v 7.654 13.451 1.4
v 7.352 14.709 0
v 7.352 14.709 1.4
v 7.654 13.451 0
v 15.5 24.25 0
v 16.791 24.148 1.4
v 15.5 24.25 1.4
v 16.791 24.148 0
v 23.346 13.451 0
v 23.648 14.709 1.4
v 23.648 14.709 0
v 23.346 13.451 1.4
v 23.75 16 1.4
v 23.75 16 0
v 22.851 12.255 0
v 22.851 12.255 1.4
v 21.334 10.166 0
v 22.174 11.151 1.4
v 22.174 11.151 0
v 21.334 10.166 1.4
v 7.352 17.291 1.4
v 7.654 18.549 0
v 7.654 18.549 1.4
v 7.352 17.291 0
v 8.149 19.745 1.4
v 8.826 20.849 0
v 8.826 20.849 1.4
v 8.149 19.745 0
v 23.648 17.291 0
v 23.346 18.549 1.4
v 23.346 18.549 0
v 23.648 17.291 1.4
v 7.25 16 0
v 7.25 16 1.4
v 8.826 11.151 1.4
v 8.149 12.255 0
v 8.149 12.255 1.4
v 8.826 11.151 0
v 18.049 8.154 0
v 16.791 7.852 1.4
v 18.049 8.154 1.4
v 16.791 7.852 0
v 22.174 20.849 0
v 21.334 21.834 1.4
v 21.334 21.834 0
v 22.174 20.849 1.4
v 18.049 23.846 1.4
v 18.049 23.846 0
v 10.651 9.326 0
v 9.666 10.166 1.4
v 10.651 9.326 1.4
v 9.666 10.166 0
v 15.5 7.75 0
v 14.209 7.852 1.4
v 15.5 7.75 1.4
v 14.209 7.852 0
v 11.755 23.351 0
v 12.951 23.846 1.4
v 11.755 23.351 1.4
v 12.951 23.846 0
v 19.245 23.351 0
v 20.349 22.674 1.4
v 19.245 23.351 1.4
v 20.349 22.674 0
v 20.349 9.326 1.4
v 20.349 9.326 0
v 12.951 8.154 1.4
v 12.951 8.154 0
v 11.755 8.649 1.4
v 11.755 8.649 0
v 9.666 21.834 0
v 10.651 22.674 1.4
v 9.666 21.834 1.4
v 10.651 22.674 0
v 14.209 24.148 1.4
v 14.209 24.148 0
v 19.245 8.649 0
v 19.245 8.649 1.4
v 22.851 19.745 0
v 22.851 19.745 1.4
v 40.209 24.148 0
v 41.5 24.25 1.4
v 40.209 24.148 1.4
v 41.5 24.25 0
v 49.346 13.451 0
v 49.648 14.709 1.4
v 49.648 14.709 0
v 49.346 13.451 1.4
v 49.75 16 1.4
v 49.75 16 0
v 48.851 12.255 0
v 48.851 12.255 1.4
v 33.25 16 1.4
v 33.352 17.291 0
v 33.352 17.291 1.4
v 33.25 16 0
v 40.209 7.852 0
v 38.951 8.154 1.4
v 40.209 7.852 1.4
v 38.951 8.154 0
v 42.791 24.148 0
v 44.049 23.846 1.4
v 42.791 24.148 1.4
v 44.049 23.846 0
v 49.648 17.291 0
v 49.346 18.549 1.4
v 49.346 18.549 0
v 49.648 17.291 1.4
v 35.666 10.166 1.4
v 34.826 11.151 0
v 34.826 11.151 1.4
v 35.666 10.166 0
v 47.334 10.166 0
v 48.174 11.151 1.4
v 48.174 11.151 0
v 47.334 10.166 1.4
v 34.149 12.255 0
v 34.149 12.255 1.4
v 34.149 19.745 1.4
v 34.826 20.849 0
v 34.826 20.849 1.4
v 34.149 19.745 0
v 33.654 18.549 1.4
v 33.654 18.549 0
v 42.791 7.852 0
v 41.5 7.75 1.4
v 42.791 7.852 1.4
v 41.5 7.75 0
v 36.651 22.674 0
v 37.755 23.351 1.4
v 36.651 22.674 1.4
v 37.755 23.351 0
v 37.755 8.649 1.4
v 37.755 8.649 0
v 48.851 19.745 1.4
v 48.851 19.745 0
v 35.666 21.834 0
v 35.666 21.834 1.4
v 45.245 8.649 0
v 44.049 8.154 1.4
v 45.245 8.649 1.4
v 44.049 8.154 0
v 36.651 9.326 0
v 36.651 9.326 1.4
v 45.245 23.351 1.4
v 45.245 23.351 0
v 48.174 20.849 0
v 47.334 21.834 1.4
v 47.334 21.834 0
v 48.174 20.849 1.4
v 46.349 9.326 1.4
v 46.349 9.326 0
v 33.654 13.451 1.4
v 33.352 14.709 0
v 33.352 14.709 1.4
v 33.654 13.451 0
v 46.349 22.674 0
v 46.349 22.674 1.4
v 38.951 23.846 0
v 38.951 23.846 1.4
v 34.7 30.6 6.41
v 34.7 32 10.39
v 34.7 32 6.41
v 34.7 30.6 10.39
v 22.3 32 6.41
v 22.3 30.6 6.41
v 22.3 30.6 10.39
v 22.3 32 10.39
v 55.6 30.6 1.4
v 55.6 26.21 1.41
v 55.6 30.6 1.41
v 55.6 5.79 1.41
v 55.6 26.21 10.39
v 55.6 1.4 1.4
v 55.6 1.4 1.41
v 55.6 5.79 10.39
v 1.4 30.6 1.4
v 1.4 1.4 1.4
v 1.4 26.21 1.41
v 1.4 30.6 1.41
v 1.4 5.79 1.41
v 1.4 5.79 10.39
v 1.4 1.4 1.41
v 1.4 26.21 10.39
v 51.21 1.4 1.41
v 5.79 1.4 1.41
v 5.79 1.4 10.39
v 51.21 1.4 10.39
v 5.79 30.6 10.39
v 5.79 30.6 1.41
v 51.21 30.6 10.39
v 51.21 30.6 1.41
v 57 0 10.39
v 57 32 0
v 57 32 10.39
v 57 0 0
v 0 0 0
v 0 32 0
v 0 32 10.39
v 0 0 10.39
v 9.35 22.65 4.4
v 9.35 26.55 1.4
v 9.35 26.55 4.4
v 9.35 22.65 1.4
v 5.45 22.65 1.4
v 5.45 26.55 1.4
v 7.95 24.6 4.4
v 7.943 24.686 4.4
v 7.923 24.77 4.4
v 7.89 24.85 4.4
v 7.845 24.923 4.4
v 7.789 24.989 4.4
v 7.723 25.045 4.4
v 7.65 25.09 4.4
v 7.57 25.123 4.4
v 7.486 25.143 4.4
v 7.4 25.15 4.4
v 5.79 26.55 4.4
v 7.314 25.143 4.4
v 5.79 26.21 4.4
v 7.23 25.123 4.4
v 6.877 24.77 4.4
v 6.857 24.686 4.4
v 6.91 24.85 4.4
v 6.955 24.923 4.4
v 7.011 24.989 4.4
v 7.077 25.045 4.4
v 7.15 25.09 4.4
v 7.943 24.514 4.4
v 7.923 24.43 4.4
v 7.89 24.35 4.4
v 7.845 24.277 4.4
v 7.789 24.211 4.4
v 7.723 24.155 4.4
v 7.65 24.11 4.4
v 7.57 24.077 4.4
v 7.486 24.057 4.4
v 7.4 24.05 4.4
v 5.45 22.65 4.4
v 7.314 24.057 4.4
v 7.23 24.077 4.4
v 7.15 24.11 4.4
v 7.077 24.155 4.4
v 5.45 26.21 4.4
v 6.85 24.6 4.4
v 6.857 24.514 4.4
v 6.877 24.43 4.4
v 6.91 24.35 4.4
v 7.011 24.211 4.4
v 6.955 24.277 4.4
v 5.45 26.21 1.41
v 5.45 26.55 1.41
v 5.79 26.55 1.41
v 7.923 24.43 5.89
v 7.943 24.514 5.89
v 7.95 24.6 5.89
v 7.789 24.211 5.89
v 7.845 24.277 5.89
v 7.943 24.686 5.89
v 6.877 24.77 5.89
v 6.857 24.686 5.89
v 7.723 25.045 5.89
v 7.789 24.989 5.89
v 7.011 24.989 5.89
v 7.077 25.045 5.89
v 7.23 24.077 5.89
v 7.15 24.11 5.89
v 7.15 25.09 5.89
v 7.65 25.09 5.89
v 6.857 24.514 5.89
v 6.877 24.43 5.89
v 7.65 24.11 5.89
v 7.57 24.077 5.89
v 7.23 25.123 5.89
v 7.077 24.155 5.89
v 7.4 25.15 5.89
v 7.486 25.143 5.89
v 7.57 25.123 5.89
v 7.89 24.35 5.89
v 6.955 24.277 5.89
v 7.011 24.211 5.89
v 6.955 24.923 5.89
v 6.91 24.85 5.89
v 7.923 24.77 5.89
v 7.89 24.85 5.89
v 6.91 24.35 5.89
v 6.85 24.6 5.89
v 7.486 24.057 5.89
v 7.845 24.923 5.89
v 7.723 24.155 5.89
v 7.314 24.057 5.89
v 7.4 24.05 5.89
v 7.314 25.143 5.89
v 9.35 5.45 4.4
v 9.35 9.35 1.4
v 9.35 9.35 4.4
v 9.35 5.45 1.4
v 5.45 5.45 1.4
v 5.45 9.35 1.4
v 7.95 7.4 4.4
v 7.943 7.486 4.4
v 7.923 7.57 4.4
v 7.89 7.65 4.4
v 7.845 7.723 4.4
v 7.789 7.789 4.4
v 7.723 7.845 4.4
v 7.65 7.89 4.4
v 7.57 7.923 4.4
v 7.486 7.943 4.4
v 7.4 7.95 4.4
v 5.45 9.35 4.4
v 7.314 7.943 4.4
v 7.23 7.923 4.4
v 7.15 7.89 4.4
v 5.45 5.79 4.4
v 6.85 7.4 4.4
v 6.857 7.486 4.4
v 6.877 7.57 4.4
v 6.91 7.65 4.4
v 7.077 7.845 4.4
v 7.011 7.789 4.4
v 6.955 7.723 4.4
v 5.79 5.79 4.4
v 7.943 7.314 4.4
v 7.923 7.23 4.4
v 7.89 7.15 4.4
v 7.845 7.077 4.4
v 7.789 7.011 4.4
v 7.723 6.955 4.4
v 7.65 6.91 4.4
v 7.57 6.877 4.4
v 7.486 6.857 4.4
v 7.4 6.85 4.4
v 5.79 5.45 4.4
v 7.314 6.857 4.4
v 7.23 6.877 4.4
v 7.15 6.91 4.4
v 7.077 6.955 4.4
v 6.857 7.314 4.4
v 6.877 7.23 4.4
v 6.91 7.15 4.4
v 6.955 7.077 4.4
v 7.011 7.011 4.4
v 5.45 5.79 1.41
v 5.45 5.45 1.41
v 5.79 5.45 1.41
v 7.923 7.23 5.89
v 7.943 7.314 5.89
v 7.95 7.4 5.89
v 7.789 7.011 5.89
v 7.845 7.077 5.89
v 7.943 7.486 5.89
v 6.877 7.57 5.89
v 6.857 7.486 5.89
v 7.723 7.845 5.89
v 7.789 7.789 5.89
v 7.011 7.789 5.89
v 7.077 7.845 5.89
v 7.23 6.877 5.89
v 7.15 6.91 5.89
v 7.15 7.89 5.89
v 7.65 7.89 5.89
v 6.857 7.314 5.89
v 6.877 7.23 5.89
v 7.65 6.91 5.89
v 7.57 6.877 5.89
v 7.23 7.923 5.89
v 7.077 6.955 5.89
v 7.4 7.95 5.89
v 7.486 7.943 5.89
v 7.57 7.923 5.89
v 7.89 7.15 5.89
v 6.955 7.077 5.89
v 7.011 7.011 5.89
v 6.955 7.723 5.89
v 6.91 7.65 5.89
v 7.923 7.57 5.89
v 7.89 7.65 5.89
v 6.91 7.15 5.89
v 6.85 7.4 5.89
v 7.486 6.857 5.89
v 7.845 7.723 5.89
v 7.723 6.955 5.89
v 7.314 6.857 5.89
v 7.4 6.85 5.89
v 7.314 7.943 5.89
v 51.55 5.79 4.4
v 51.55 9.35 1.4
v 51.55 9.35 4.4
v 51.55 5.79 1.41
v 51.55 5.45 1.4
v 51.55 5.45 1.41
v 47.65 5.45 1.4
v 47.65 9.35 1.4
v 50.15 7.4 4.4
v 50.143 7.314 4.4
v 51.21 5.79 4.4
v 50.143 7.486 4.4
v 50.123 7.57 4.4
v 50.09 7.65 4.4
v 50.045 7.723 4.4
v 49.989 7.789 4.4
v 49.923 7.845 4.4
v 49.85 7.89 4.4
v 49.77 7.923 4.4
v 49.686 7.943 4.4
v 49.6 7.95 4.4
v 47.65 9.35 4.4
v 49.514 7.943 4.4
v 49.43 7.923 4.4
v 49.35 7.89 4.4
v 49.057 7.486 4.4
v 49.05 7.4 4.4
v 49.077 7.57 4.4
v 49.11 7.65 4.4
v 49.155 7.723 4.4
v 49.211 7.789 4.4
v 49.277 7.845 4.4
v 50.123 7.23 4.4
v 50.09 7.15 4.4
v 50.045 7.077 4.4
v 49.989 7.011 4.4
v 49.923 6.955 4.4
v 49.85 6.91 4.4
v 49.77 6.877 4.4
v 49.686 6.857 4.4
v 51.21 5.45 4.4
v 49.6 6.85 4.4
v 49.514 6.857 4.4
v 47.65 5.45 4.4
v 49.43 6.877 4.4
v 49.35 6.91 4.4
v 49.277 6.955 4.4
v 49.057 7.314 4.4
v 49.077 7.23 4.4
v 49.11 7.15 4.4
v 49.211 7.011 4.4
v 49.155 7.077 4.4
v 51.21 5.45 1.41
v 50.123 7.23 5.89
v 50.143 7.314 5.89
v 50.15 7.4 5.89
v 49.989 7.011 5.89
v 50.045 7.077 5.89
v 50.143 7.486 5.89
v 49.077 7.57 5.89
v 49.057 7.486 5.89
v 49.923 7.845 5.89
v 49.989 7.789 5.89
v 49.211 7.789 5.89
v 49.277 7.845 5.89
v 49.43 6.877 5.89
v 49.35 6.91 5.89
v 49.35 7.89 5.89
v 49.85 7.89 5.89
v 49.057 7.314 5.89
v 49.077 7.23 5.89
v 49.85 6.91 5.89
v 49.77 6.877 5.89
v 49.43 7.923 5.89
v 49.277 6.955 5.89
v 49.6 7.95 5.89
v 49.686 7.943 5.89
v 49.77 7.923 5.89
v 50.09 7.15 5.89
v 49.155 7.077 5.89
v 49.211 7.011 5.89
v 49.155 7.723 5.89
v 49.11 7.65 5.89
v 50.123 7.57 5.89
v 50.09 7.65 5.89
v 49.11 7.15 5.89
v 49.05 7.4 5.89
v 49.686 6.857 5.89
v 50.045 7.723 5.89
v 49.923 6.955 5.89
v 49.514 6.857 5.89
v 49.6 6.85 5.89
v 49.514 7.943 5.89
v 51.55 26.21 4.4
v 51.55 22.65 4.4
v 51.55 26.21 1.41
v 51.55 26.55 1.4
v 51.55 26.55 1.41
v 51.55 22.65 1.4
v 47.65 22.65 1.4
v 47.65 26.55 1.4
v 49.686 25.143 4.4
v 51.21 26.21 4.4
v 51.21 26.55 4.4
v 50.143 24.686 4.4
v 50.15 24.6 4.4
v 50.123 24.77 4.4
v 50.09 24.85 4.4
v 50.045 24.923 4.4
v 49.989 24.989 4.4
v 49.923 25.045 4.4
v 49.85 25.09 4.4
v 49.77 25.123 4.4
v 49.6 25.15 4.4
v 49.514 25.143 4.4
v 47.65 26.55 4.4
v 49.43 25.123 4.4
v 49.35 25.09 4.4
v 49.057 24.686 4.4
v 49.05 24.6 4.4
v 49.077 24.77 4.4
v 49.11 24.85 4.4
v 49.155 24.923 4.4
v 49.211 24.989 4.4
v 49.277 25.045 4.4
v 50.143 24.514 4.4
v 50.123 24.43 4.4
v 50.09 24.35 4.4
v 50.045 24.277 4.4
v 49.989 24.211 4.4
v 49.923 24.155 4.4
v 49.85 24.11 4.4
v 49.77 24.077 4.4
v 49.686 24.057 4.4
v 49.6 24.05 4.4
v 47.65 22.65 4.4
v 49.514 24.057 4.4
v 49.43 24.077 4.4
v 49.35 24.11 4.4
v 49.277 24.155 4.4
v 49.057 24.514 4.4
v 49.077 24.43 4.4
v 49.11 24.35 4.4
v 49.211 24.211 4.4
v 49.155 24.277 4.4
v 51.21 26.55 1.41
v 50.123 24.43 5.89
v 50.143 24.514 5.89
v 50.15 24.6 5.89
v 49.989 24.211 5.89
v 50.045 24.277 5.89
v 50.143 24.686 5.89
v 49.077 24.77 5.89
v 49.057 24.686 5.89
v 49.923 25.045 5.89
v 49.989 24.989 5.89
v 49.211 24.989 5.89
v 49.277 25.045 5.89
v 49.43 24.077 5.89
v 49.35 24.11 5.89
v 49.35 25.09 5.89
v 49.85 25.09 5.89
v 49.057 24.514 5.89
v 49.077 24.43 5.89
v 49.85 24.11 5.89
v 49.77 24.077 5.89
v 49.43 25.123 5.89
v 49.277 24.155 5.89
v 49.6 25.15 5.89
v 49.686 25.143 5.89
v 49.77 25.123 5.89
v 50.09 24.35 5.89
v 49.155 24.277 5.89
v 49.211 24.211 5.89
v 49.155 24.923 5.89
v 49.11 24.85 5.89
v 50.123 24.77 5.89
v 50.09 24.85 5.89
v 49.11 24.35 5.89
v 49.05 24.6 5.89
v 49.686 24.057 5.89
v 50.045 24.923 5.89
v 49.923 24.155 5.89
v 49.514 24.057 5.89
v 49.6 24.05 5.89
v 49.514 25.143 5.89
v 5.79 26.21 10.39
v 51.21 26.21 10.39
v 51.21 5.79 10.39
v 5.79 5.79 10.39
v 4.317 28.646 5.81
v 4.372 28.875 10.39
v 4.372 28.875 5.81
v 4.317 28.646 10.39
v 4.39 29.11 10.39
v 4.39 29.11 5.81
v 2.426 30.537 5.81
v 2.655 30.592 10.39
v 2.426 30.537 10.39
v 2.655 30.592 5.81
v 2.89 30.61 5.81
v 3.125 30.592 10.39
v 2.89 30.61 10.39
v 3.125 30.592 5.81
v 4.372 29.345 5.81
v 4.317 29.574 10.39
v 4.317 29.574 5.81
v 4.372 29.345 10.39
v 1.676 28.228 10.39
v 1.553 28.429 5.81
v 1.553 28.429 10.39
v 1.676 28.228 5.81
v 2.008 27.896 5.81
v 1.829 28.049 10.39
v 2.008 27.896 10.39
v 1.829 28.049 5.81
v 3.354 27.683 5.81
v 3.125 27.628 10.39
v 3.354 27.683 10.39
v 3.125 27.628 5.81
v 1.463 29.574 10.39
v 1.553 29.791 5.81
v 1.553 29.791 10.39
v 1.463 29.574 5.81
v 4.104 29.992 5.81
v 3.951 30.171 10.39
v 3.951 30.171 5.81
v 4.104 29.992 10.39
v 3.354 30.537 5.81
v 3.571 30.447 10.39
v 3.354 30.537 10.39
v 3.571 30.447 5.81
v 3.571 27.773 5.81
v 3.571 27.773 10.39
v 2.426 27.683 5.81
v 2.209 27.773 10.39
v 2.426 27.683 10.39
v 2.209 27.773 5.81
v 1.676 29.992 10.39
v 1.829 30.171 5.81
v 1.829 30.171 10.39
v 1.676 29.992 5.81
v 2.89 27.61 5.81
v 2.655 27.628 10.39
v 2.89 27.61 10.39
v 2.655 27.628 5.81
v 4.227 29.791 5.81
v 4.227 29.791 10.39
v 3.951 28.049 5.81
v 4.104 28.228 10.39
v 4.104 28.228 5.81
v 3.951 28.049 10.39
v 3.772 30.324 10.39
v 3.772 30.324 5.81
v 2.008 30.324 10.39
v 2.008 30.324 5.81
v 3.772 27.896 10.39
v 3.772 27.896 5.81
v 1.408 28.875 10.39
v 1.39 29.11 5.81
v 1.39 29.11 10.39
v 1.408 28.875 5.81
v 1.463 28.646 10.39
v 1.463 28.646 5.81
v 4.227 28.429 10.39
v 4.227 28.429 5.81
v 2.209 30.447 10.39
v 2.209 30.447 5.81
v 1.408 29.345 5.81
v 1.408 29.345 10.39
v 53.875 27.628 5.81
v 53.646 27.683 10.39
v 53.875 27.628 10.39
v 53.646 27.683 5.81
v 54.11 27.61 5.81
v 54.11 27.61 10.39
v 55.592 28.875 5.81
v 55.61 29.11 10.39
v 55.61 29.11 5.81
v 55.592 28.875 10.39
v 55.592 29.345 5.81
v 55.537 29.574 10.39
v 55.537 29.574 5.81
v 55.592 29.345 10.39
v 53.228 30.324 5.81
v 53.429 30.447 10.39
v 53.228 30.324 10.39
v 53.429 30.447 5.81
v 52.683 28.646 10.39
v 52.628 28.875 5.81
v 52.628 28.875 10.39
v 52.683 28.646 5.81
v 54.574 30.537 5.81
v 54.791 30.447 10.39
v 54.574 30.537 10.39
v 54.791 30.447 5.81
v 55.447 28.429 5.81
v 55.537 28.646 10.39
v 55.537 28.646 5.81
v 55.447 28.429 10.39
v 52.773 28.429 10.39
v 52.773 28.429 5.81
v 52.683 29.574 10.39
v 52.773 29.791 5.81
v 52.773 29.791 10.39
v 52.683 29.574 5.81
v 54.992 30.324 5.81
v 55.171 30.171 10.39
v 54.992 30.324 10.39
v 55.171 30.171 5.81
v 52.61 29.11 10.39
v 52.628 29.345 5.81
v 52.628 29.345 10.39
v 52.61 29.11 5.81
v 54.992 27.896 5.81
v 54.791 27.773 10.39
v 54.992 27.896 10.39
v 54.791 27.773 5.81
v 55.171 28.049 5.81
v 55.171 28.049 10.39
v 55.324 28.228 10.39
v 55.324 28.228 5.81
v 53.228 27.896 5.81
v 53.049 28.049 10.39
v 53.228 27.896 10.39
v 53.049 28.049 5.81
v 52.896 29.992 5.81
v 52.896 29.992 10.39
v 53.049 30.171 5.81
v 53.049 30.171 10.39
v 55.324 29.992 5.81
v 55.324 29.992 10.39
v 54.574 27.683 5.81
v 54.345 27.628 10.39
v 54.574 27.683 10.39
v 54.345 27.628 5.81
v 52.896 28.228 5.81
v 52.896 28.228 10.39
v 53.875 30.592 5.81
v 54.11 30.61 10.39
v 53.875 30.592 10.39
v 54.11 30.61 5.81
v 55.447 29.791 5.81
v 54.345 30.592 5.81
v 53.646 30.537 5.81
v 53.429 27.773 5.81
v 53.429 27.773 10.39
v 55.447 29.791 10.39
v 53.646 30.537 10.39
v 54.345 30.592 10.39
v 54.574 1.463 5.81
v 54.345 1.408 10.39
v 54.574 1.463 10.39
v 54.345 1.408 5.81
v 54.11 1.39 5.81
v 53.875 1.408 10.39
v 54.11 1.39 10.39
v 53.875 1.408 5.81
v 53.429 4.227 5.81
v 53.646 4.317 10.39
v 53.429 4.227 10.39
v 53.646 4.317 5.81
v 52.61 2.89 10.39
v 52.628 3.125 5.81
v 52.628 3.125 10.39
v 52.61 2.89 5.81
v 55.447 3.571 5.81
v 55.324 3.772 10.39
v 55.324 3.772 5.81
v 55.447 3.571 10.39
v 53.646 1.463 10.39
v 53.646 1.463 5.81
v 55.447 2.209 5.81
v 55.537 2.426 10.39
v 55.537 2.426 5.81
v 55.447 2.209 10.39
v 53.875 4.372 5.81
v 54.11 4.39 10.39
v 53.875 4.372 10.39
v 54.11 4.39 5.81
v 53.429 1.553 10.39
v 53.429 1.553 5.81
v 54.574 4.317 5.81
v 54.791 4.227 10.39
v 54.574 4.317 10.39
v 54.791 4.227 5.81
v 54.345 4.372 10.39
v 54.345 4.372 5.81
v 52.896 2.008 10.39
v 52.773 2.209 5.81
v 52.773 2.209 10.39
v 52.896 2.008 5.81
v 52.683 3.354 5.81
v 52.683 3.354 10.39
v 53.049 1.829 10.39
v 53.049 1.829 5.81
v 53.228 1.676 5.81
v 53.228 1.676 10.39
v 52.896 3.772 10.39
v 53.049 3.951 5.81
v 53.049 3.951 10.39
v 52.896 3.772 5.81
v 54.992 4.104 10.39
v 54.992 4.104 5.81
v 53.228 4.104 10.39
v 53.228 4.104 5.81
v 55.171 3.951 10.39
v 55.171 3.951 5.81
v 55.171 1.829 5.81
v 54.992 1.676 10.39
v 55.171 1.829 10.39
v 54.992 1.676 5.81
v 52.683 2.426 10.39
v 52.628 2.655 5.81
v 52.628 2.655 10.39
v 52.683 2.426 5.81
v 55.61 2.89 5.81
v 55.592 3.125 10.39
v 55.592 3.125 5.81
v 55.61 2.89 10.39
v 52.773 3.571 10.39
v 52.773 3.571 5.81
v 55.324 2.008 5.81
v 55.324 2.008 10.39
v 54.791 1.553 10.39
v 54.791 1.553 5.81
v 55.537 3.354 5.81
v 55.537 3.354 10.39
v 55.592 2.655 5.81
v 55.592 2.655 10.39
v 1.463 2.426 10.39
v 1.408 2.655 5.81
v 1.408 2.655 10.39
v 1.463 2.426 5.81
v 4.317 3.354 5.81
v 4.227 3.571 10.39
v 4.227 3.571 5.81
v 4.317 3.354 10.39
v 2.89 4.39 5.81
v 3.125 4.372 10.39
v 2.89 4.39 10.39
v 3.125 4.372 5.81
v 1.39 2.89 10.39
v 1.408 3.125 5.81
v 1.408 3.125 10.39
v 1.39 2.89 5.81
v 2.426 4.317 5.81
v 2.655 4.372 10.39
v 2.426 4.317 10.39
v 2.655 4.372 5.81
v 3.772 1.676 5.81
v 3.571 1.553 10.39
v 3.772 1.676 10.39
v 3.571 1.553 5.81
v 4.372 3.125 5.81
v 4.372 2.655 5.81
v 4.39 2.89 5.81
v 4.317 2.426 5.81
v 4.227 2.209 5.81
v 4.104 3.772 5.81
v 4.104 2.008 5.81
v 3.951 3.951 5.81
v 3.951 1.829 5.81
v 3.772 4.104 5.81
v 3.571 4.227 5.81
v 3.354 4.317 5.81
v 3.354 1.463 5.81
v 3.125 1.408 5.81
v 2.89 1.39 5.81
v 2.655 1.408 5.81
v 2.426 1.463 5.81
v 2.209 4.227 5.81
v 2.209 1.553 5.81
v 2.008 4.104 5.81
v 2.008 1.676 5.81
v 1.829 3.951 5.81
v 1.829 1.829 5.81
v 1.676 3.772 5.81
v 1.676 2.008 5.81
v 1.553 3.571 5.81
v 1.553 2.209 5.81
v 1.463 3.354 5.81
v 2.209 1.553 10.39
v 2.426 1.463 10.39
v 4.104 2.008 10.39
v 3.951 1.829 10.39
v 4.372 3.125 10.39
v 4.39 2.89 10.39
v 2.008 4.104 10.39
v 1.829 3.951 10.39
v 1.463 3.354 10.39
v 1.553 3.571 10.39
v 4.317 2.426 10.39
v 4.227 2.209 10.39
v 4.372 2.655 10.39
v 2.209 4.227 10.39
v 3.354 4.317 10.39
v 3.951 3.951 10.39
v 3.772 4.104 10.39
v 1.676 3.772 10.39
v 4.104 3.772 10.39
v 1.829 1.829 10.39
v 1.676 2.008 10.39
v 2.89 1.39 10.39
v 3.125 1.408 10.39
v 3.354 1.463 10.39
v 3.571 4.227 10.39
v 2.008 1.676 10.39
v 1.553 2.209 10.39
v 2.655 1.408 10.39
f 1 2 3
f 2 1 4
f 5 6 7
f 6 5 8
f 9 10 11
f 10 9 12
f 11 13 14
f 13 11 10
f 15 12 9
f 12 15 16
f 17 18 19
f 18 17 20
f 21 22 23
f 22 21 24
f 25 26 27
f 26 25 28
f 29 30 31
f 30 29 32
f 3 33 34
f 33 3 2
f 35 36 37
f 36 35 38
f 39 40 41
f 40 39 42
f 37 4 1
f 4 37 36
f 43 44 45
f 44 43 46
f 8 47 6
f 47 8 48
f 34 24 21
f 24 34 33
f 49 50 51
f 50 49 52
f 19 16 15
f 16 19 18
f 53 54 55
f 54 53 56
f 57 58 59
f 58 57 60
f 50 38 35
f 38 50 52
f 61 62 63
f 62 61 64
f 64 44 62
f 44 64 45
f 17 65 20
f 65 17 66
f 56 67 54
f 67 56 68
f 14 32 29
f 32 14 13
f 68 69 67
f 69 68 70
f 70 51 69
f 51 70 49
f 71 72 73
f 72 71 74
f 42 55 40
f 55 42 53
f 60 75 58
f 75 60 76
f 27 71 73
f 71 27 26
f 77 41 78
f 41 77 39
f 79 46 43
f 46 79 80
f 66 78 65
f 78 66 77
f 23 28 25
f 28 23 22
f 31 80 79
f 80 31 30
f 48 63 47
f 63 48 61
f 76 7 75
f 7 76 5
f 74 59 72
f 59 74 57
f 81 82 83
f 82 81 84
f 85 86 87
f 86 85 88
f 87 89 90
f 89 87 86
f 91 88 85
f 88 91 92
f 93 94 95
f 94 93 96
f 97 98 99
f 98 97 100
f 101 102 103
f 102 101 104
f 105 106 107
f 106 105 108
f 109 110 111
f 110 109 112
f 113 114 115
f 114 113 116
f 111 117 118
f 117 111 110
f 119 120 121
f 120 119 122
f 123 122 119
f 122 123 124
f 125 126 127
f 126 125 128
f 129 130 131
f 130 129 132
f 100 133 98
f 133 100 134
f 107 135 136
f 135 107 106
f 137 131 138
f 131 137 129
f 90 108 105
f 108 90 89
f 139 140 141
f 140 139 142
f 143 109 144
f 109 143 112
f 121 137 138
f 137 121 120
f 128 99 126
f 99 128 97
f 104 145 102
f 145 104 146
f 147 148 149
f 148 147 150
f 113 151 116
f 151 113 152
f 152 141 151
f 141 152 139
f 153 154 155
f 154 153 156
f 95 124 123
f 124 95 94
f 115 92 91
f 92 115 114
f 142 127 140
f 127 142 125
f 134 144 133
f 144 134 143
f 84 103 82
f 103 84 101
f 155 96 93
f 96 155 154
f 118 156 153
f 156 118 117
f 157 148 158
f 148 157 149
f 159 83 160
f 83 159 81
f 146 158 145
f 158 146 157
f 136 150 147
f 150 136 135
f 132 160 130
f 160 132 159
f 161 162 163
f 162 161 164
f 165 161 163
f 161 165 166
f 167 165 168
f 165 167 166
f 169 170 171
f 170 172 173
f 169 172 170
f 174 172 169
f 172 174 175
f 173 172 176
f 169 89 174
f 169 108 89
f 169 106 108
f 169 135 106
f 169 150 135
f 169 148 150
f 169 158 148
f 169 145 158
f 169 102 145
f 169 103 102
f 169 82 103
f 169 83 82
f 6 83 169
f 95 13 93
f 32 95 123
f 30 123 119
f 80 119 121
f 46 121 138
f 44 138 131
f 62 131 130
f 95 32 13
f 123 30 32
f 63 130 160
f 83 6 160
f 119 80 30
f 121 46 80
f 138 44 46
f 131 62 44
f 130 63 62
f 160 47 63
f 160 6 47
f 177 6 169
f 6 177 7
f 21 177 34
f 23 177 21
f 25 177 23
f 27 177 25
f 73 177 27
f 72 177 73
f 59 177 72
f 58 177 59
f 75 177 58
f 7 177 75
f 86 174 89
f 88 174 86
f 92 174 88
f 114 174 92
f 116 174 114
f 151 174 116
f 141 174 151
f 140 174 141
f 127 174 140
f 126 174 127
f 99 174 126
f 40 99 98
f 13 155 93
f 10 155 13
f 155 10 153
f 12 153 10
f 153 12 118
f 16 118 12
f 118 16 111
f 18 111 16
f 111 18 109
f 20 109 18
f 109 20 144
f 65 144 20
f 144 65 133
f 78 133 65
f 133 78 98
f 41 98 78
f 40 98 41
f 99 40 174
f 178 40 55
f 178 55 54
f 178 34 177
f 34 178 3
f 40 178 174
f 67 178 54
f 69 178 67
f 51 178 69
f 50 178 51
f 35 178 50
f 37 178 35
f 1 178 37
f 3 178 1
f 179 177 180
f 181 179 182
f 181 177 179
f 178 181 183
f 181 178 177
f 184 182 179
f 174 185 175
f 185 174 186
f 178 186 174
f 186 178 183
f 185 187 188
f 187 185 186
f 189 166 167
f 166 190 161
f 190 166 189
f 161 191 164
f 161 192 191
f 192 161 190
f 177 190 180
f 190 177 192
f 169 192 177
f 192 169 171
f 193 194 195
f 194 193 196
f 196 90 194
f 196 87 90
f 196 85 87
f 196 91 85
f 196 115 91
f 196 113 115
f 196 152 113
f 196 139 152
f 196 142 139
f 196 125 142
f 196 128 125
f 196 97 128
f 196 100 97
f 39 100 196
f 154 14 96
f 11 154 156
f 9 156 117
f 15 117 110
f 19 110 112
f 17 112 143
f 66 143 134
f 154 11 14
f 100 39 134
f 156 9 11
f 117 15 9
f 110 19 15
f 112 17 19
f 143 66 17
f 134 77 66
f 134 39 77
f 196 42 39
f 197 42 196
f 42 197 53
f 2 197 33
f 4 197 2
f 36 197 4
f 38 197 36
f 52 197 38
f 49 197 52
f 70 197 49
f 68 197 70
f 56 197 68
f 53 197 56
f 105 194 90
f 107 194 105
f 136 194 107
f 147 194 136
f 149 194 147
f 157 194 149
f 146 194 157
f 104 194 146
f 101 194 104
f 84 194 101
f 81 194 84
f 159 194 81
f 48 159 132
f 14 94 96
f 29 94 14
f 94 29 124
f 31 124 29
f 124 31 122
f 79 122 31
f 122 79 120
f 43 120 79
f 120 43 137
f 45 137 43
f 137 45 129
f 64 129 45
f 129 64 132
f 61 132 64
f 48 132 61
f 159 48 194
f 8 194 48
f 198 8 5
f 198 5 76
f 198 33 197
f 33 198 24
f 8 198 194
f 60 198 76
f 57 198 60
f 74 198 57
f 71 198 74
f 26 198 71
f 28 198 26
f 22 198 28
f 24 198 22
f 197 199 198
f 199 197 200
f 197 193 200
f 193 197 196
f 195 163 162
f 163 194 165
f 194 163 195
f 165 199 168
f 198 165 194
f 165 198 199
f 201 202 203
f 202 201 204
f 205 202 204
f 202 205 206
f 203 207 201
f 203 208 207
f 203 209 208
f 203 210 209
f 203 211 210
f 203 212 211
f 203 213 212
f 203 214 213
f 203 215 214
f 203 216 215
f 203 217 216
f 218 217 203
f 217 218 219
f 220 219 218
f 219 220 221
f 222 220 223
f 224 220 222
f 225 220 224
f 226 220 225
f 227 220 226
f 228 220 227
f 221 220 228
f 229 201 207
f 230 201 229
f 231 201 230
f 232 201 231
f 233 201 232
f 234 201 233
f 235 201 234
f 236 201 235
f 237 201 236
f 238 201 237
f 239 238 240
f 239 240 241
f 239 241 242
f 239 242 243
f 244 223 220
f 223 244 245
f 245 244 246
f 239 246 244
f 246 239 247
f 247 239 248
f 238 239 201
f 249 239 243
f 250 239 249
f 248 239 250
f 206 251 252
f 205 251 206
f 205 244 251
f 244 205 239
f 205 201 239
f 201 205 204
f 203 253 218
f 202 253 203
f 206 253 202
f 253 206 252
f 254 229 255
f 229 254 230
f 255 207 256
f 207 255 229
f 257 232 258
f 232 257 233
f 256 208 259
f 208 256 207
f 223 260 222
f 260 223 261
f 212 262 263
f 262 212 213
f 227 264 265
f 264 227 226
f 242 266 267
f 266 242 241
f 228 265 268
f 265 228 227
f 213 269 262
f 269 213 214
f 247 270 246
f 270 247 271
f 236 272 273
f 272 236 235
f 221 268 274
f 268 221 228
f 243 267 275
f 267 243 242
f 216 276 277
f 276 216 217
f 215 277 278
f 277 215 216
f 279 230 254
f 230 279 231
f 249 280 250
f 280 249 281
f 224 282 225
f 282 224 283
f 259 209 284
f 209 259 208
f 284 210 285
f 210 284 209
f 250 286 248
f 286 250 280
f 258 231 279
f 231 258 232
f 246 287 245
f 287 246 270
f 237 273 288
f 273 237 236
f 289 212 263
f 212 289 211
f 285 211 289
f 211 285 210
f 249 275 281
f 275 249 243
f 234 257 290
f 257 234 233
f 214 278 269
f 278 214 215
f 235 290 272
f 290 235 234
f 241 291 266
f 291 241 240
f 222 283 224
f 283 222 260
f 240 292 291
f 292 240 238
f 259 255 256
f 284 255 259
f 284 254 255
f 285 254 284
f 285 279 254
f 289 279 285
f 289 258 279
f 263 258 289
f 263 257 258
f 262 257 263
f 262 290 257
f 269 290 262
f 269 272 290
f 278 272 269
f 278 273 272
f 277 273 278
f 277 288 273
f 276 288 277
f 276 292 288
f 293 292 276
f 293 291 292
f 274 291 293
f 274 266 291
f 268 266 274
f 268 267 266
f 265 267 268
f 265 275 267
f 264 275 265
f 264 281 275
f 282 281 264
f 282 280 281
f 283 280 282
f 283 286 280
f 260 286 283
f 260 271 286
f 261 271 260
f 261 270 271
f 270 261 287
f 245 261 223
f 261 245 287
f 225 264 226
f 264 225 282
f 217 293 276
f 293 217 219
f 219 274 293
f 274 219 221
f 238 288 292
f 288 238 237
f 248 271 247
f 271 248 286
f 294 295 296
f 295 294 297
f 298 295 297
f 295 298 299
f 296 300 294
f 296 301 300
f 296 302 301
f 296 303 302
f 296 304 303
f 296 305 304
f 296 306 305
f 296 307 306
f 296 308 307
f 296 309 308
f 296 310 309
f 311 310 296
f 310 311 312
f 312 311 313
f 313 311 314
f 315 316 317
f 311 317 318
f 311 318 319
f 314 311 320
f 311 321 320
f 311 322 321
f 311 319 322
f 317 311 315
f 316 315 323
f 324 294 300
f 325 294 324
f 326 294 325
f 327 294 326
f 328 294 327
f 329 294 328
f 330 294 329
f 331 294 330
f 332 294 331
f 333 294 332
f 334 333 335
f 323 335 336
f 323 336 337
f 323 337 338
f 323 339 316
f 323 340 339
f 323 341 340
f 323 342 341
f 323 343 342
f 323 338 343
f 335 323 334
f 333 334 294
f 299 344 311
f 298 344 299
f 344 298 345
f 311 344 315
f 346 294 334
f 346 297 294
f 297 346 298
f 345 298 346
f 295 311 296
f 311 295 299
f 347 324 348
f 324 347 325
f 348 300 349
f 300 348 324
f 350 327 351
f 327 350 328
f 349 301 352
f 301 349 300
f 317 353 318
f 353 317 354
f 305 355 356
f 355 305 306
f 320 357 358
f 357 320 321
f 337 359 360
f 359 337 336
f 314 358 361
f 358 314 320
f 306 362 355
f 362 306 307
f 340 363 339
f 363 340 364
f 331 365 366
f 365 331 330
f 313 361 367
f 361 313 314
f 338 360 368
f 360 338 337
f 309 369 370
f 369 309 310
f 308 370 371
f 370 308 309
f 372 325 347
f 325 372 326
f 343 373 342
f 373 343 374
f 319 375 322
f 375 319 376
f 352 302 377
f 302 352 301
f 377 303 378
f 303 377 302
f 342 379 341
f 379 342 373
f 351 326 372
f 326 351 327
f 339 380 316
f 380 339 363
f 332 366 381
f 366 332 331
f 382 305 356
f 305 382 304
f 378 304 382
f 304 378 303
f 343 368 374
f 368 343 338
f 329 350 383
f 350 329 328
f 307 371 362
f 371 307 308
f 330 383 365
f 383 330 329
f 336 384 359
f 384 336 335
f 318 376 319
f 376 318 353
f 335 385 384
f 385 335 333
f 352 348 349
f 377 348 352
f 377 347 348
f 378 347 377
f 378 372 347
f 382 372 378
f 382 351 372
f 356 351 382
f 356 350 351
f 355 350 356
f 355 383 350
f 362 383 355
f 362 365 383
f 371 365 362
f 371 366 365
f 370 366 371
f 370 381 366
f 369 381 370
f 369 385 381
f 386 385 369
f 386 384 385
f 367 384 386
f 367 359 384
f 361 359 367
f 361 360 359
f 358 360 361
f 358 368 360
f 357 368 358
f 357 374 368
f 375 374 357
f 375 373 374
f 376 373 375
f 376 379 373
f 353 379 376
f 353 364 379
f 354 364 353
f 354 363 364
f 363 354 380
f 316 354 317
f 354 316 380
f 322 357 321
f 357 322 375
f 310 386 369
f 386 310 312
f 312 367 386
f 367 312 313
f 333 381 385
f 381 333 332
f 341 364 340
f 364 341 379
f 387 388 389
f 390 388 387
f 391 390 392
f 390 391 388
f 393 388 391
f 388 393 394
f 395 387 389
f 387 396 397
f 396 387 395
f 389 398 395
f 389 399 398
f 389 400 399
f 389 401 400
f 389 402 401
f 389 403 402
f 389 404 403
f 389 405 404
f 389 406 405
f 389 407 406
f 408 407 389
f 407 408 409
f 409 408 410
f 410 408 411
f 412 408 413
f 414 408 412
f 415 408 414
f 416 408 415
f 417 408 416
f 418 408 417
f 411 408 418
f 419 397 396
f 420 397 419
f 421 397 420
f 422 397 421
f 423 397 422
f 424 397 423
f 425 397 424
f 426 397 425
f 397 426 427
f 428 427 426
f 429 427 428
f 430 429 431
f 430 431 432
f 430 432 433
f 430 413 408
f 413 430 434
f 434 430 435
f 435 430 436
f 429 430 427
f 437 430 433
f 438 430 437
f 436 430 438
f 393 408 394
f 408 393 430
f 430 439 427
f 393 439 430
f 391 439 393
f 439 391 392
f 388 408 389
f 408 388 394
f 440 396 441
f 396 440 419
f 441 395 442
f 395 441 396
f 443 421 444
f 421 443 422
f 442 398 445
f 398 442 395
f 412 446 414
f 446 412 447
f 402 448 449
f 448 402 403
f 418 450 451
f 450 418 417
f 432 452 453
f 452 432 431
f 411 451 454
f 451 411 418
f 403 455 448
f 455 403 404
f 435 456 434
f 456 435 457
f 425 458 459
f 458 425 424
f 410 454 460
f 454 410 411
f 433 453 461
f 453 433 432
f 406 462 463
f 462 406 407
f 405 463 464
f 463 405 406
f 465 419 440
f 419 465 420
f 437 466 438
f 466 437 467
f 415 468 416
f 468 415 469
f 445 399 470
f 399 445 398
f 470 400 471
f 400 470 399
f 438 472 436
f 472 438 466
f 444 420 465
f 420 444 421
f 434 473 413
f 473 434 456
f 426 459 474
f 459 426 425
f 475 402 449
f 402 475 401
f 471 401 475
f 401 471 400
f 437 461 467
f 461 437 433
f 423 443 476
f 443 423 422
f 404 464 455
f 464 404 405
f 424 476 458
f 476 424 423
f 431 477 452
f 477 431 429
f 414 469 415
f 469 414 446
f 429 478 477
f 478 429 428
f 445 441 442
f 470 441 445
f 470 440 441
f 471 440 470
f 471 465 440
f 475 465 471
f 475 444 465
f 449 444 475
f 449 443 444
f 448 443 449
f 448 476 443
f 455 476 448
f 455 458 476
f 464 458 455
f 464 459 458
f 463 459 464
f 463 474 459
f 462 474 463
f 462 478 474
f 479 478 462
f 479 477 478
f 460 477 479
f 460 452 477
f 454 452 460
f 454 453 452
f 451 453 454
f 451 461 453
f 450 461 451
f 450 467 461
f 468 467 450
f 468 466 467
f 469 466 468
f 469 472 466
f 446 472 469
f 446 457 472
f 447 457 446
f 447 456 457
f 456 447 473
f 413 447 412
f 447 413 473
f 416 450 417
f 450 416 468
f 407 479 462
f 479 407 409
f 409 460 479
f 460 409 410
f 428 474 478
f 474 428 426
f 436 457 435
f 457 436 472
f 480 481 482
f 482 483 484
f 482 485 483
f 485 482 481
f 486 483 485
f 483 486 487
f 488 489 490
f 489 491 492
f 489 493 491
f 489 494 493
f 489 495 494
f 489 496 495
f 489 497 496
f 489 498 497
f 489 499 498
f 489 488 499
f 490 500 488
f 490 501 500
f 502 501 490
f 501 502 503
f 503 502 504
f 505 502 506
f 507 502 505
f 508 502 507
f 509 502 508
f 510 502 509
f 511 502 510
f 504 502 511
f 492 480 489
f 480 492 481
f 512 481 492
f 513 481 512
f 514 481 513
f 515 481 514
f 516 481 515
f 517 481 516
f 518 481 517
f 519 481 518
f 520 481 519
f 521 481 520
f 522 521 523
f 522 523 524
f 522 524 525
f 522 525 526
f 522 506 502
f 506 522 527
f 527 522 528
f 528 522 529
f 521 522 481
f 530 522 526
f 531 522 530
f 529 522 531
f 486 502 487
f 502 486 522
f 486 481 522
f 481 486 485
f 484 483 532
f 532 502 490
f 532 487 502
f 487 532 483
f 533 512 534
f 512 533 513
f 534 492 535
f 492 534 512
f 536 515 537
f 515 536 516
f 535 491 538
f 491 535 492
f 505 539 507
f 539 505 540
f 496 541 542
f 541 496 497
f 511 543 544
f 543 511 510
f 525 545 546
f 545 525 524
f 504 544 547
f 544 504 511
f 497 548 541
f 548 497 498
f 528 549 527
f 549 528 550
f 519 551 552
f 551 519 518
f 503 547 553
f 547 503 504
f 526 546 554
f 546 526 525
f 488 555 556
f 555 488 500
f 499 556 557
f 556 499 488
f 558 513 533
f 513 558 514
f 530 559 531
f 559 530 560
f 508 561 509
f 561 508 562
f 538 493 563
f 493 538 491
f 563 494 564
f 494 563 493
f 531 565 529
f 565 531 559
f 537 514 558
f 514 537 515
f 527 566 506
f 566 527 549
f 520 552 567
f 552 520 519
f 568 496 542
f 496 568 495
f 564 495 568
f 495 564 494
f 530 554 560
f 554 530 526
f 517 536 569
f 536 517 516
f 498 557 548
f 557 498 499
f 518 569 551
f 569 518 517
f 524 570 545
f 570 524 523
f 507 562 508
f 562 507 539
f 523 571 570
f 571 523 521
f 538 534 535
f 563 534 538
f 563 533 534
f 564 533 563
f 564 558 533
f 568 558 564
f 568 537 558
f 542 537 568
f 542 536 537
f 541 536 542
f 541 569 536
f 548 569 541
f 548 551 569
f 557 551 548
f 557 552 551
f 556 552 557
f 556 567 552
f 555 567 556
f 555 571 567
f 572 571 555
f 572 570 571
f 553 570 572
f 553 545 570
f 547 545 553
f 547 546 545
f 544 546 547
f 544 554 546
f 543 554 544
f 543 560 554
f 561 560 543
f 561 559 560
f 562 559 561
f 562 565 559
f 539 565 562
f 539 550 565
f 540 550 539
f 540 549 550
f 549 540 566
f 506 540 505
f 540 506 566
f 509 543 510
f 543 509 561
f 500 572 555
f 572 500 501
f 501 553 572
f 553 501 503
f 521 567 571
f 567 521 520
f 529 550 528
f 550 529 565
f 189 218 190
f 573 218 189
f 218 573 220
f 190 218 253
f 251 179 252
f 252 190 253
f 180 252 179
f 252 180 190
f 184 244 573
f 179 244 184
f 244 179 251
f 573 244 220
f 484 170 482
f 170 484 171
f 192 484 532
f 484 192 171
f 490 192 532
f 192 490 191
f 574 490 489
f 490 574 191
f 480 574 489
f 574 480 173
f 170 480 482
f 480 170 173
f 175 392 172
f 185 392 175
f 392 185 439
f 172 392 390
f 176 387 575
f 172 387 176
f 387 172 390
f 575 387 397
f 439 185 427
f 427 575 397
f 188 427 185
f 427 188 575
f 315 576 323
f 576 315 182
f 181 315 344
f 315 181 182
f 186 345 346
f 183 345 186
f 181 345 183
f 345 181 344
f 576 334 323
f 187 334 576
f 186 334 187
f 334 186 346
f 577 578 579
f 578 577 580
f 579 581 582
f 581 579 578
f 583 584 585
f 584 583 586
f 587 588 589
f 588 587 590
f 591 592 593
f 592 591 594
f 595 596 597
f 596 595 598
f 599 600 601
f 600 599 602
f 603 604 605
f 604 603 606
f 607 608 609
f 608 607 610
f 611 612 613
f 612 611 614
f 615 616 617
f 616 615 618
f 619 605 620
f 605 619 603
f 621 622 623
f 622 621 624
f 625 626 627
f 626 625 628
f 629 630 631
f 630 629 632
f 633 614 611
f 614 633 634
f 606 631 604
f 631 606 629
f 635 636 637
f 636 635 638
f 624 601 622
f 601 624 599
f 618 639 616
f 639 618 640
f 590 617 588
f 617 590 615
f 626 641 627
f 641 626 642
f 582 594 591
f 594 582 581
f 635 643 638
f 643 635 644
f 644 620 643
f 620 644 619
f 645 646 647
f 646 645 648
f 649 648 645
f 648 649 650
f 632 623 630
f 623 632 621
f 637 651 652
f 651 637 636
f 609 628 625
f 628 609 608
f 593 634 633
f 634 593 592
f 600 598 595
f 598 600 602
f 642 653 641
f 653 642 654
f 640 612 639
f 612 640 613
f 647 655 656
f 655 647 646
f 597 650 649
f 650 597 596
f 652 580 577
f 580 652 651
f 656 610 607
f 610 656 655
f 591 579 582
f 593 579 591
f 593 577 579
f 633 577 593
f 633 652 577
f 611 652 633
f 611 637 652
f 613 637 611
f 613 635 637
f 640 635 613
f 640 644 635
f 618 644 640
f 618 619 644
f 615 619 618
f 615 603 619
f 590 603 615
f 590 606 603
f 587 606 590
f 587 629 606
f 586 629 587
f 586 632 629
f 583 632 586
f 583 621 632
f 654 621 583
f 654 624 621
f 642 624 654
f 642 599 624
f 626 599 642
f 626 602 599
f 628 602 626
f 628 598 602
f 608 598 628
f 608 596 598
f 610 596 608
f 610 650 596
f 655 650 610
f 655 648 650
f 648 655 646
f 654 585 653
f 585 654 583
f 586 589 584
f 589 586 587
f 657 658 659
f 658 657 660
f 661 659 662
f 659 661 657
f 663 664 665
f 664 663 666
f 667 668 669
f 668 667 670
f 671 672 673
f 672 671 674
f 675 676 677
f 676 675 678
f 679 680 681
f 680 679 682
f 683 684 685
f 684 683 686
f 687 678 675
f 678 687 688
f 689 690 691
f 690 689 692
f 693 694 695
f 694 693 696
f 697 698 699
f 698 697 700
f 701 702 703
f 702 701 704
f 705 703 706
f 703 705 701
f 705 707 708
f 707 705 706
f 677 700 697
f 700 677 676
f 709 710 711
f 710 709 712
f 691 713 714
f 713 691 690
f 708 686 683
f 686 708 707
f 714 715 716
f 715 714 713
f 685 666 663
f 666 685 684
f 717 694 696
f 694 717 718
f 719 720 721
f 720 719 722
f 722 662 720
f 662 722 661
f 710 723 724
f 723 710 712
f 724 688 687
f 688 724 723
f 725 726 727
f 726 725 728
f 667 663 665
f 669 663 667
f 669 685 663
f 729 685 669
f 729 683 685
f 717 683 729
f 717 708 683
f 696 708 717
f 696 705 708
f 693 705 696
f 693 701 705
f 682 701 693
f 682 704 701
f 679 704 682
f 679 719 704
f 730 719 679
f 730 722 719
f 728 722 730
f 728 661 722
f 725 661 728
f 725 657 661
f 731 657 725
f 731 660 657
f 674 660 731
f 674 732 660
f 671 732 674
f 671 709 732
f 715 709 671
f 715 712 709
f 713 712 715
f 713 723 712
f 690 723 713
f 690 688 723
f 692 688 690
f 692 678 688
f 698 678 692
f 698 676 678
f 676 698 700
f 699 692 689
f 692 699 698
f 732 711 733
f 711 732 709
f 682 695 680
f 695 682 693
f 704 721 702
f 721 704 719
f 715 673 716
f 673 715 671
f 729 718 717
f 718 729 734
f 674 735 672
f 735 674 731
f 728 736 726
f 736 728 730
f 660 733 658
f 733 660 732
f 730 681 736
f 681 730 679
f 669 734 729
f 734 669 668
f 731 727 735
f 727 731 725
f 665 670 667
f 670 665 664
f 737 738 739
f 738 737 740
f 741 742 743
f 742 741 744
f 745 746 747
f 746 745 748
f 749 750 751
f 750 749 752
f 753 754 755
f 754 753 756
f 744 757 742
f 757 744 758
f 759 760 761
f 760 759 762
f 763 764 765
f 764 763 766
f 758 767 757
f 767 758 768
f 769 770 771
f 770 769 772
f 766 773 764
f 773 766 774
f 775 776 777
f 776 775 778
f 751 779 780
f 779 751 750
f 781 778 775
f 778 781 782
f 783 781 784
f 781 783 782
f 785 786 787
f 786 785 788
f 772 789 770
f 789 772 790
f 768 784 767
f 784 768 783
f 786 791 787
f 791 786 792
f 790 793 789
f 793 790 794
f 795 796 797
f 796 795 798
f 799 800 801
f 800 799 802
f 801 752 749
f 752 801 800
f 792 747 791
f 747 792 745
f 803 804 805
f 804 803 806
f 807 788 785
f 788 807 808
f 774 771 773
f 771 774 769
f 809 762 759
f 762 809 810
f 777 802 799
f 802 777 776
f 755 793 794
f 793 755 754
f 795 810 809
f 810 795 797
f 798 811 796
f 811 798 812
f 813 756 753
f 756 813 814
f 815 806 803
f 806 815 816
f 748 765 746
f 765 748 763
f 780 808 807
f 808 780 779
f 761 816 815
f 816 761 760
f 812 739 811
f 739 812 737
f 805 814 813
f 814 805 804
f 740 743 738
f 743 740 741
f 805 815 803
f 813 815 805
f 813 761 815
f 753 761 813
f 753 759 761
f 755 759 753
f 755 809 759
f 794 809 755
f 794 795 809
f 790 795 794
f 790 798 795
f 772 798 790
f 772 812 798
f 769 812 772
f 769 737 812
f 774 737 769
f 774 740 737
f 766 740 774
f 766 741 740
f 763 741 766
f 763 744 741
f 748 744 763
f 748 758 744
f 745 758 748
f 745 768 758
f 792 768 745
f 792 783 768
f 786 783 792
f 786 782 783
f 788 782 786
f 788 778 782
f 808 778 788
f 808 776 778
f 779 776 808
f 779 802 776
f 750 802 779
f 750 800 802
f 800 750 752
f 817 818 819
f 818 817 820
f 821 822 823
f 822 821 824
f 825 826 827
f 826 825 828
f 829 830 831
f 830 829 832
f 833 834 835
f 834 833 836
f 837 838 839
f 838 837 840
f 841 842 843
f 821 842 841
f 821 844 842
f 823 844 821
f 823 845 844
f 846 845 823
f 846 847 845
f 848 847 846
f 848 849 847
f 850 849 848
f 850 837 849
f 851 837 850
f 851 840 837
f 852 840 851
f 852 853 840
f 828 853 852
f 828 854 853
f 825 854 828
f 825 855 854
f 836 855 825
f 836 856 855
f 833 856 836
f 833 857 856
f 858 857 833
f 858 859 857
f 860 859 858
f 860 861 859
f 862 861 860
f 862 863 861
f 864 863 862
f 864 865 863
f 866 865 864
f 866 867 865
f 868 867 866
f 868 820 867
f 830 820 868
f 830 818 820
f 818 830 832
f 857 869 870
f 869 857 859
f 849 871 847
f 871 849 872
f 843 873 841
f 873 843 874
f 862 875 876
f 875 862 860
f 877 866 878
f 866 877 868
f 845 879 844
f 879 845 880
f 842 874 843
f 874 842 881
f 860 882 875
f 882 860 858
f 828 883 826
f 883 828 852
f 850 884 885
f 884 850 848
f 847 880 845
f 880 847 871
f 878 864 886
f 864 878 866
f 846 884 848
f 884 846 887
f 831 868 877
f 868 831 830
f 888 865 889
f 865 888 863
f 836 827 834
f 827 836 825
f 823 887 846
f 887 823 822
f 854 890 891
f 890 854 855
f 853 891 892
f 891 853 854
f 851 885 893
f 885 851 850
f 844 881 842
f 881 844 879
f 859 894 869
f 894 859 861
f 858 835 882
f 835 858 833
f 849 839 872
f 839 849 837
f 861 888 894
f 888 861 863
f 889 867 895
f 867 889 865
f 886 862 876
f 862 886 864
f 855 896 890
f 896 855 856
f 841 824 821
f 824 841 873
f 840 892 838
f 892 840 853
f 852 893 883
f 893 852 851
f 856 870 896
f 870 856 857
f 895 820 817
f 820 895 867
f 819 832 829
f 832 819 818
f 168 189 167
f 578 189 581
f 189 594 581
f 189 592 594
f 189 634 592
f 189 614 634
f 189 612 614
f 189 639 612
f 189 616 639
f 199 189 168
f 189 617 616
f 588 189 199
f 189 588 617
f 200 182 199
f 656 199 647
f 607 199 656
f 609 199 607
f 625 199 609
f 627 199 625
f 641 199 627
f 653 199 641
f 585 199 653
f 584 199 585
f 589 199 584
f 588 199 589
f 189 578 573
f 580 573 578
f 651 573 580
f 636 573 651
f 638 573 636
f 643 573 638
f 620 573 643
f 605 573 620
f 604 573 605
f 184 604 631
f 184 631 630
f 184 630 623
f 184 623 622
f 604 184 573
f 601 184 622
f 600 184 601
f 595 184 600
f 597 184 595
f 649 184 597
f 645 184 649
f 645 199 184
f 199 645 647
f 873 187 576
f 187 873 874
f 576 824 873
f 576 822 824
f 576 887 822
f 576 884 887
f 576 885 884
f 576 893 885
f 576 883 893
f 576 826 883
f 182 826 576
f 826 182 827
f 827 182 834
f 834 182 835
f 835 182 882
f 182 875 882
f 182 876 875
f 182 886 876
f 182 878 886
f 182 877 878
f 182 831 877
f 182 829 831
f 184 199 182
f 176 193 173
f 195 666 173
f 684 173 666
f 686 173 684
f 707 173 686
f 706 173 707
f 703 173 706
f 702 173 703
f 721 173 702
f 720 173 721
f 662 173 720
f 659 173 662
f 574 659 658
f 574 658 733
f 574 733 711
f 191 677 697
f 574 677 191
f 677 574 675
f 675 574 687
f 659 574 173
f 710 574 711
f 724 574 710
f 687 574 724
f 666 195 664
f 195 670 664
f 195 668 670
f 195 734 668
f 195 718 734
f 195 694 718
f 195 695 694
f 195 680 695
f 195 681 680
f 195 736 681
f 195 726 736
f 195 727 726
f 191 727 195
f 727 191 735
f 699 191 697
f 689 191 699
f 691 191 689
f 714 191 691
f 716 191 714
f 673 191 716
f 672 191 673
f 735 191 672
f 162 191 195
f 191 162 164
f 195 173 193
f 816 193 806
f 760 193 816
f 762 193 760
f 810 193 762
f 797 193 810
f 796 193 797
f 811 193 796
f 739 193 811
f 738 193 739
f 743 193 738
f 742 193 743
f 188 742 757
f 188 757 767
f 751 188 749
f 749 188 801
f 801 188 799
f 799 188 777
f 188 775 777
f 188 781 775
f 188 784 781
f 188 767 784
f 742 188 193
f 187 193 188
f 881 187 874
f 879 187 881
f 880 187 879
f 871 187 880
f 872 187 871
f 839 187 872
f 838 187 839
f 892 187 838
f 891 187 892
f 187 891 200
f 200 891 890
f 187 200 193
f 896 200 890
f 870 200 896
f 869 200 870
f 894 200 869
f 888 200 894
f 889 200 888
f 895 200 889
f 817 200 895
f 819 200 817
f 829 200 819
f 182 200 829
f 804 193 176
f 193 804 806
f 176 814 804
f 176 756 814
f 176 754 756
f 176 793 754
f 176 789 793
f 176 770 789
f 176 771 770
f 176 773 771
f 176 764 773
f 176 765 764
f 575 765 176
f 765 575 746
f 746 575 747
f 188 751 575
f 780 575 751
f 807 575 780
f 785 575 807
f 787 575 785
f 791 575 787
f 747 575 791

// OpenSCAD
// file: ball_and_socket.scad
include <MCAD/units.scad>

ball_radius = 15/2;
socket_gap = 0.0;
socket_wall = 0.8;
stalk_radius = 10/2;
stalk_height = 10;

socket_stalk_height = 5;
// This is the amount of the socket past half-sphere to lock in the ball
socket_lock = 2.5;

socket_cut_depth = 4;
socket_cut_width = 1.0;

mount_dims = [20, 20, 0.6];

module ball_stalk_test() {
  union() {
    cube(mount_dims);
    translate([mount_dims[0]/2, mount_dims[1]/2, mount_dims[2]-epsilon])
      ball_stalk(ball_radius, stalk_height, stalk_radius);
  }
}

module ball_stalk(ball_radius, stalk_height, stalk_radius) {
  $fn = 80;
  union() {
    cylinder(stalk_height, stalk_radius, stalk_radius);
    translate([0, 0, stalk_height + ball_radius - stalk_radius])
      sphere(ball_radius);
  }
}

module ball_socket_test() {

  union() {
    cube(mount_dims);
    translate([mount_dims[0]/2, mount_dims[1]/2, mount_dims[2]-epsilon])
      ball_socket(ball_radius, socket_stalk_height, stalk_radius, socket_lock);
  }
}

module ball_socket(ball_radius, socket_stak_height, stalk_radius, socket_lock) {
  $fn = 80;

  in_r = ball_radius + socket_gap;
  out_r = in_r + socket_wall;

  socket_center_z = (mount_dims[2]-epsilon + socket_stalk_height
		     + out_r - stalk_radius);

  difference() {
    union() {
      cylinder(socket_stalk_height+out_r, stalk_radius, stalk_radius);
      translate([0, 0, socket_stalk_height + out_r - stalk_radius]) {
	sphere(out_r);
      }
    }
    // Carve-out socket "bowl"
    translate(socket_center_z*Z) sphere(in_r);

    d = out_r*2+2;
    // Cut off top of socket sphere.
    translate([-d/2-1, -d/2-1, socket_center_z+socket_lock]) cube([d, d,out_r]);

    // Cuts in top of socket for flexibility.
    cd = socket_cut_depth;
    cw = socket_cut_width;
    translate([-cw/2, -d/2-1, socket_center_z+socket_lock-cd])
      cube([cw, d+2, cd+1]);
    translate([-d/2-1, -cw/2, socket_center_z+socket_lock-cd])
      cube([d+2, cw, cd+1]);
  }
}

//ball_stalk_test();
//translate([25, 0, 0]) ball_socket_test();
// file: sonar_box.scad
include <MCAD/units.scad>
include <ball_and_socket.scad>

board_dims = [45, 20, 1];
board_corner_hole_radius = 0.7;
board_corner_hole_offset = 1.4;

above_board = 3;
below_board = 5;
gap = 0.2;

hole_radius = 16.5/2;
between_holes = 9.5;

connector_x = 12;
connector_z = 3;
// space below board to connector.
connector_offset_z = 1;

wall_thickness = 1.4;
screw_diameter = 3;

mount_width = screw_diameter + wall_thickness;
board_offset = gap+mount_width;

inner = (board_dims + [2,2,0]*board_offset + Z*(below_board+above_board));
outer = inner + [2,2,2]*wall_thickness;


module sonar_box(top) {
  wall = wall_thickness;

  x_offset = (inner[0] - 4*hole_radius - between_holes) / 2;
  y_offset = inner[1]/2 - hole_radius;

  $fn = 40;

  module screw_mount(x, y, rot) {
    w = mount_width;
    o = board_corner_hole_offset;
    translate([wall+x, wall+y, wall-epsilon]) rotate(rot, Z)
      cube([w, w, inner[2]]);
  }
  module screw_hole(x, y, rot) {
    r = screw_diameter/2;
    l = 6;
    translate([wall+x, wall+y, -epsilon]) rotate(rot, Z) translate([r, r, 0])
      cylinder(l, r, r);
  }

  screw_mount_x = [-epsilon, inner[0]+epsilon];
  screw_mount_y = [-epsilon, inner[1]+epsilon];

  module board_mount(x, y) {
    r = board_corner_hole_radius-0.15;
    w = 2 * (r+wall);
    pin_h = board_dims[2] + 0.5;
    translate([x, y, inner[2]+epsilon-above_board]) union() {
      translate([-w/2, -w/2, 0]) cube([w, w, above_board]);
      translate([0, 0, -pin_h+epsilon]) cylinder(pin_h, r, r);
    }
  }

  difference() {
    union() {
      // Outer shell
      difference() {
	cube(outer);
	translate([1,1,1]*wall) {
	  cube(inner);
	  translate([inner[0]/2, inner[1]/2, inner[2]-wall]) {
	    dx = between_holes/2 + hole_radius;
	    // Speaker holes
	    translate([-dx, 0, 0]) cylinder(3*wall, hole_radius, hole_radius);
	    translate([+dx, 0, 0]) cylinder(3*wall, hole_radius, hole_radius);

	    // Connector slot.
	    gap_to_slot = above_board + board_dims[2] + connector_offset_z;
	    translate([-connector_x/2-gap, -outer[1]/2-wall,
		       -inner[2]+wall-epsilon])
	      cube([connector_x+2*gap, 3*wall, inner[2]-gap_to_slot]);
	  }
	}
      }  // difference

      // Corners for m3 bolts to screw into.
      screw_mount(screw_mount_x[0], screw_mount_y[0], 0);
      screw_mount(screw_mount_x[1], screw_mount_y[0], 90);
      screw_mount(screw_mount_x[1], screw_mount_y[1], 180);
      screw_mount(screw_mount_x[0], screw_mount_y[1], 270);

      // Board mounts
      translate([outer[0]/2, outer[1]/2, wall-epsilon]) {
	dx = board_dims[0]/2 - board_corner_hole_offset;
	dy = board_dims[1]/2 - board_corner_hole_offset;

	board_mount(-dx, -dy);
	board_mount(-dx, +dy);
	board_mount(+dx, +dy);
	board_mount(+dx, -dy);
      }

      if (!top) {
	translate([outer[0]/2, outer[1]/2, -epsilon]) rotate(180, X)
	  ball_stalk(ball_radius=7.5, stalk_height=6, stalk_radius=4);
      }
    } // Union

    // Screw holes
    screw_hole(screw_mount_x[0], screw_mount_y[0], 0);
    screw_hole(screw_mount_x[1], screw_mount_y[0], 90);
    screw_hole(screw_mount_x[1], screw_mount_y[1], 180);
    screw_hole(screw_mount_x[0], screw_mount_y[1], 270);

    // Cut off bottom or top.
    if (top) {
      translate([-1, -1, -1])
	cube([2+outer[0], 2+outer[1], 1+wall_thickness+epsilon]);
    } else {
      translate([-1, -1, wall_thickness])
	cube([2+outer[0], 2+outer[1], outer[2]]);
    }
  }  // difference
}
// main file
include <sonar_box.scad>

translate([0, outer[1], outer[2]]) rotate(180, X) sonar_box(true);
